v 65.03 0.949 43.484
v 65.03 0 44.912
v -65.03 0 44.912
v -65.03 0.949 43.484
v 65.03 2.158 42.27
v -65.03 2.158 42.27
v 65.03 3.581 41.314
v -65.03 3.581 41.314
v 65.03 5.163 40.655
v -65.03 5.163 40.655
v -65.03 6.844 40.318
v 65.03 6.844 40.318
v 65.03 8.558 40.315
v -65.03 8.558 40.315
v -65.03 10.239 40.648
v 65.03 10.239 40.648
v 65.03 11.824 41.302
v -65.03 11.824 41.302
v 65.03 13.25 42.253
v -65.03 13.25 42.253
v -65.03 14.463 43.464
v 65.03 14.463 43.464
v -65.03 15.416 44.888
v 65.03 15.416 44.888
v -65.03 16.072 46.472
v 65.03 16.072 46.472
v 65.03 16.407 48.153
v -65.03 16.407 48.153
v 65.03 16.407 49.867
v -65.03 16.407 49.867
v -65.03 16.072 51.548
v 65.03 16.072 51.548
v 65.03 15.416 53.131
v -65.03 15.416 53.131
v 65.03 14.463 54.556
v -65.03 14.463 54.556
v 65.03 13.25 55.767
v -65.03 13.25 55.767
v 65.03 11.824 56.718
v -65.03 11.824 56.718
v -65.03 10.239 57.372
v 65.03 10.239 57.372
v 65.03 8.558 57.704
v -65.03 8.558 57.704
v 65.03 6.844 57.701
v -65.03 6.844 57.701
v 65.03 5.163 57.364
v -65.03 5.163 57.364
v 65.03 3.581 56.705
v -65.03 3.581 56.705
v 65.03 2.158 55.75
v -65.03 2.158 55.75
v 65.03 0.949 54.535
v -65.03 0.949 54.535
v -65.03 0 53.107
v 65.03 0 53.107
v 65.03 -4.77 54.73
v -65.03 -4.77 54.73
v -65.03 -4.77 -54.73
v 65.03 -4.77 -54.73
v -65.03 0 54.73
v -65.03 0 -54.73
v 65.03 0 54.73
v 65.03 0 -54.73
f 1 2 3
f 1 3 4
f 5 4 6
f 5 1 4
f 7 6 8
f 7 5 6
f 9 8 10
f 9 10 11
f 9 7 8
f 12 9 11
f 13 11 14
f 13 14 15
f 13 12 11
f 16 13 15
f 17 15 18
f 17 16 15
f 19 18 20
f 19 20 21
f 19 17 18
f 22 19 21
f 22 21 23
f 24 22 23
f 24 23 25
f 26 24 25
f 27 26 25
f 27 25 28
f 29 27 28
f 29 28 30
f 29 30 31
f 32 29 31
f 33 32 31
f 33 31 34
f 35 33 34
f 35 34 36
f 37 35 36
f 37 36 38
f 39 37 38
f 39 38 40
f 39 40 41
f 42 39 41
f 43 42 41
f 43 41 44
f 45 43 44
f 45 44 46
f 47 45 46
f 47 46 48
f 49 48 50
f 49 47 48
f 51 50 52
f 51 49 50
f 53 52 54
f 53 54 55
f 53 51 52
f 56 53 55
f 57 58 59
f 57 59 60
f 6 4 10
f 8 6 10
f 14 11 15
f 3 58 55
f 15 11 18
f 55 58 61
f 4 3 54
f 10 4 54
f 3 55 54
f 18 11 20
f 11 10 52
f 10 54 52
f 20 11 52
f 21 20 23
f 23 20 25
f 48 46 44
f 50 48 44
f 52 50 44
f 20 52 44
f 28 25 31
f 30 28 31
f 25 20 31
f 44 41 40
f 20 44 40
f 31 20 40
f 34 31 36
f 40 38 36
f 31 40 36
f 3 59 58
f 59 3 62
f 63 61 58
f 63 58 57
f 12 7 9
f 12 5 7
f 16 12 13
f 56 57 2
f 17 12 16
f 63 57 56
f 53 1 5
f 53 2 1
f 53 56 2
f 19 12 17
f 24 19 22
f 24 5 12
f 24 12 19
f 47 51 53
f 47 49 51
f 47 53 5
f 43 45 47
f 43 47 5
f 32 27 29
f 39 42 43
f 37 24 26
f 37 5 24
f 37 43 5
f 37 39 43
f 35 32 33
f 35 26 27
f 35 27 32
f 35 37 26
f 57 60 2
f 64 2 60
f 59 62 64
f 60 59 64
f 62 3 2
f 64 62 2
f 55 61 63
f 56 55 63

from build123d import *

# Parameters (mm, degrees)
F0_W          = 130.06
F0_H          = 109.46
F1_DEPTH      = 4.77
F2_R          = 8.735
F3_DEPTH      = 65.03
F3_DEPTH_BACK = 65.03


with BuildPart() as f1:
    # F0 (on Front) → F1 (new body)
    with BuildSketch(Plane.XZ):
        Rectangle(F0_W, F0_H)
    extrude(amount=F1_DEPTH)

    # F2 (on Right) → F3 (join, two sides)
    with BuildSketch(Plane.YZ) as f3_sk:
        with Locations((7.71413, 49.009632)):
            Circle(F2_R)
    extrude(amount=F3_DEPTH)
    extrude(f3_sk.sketch, amount=-F3_DEPTH_BACK)


solid = f1.part
